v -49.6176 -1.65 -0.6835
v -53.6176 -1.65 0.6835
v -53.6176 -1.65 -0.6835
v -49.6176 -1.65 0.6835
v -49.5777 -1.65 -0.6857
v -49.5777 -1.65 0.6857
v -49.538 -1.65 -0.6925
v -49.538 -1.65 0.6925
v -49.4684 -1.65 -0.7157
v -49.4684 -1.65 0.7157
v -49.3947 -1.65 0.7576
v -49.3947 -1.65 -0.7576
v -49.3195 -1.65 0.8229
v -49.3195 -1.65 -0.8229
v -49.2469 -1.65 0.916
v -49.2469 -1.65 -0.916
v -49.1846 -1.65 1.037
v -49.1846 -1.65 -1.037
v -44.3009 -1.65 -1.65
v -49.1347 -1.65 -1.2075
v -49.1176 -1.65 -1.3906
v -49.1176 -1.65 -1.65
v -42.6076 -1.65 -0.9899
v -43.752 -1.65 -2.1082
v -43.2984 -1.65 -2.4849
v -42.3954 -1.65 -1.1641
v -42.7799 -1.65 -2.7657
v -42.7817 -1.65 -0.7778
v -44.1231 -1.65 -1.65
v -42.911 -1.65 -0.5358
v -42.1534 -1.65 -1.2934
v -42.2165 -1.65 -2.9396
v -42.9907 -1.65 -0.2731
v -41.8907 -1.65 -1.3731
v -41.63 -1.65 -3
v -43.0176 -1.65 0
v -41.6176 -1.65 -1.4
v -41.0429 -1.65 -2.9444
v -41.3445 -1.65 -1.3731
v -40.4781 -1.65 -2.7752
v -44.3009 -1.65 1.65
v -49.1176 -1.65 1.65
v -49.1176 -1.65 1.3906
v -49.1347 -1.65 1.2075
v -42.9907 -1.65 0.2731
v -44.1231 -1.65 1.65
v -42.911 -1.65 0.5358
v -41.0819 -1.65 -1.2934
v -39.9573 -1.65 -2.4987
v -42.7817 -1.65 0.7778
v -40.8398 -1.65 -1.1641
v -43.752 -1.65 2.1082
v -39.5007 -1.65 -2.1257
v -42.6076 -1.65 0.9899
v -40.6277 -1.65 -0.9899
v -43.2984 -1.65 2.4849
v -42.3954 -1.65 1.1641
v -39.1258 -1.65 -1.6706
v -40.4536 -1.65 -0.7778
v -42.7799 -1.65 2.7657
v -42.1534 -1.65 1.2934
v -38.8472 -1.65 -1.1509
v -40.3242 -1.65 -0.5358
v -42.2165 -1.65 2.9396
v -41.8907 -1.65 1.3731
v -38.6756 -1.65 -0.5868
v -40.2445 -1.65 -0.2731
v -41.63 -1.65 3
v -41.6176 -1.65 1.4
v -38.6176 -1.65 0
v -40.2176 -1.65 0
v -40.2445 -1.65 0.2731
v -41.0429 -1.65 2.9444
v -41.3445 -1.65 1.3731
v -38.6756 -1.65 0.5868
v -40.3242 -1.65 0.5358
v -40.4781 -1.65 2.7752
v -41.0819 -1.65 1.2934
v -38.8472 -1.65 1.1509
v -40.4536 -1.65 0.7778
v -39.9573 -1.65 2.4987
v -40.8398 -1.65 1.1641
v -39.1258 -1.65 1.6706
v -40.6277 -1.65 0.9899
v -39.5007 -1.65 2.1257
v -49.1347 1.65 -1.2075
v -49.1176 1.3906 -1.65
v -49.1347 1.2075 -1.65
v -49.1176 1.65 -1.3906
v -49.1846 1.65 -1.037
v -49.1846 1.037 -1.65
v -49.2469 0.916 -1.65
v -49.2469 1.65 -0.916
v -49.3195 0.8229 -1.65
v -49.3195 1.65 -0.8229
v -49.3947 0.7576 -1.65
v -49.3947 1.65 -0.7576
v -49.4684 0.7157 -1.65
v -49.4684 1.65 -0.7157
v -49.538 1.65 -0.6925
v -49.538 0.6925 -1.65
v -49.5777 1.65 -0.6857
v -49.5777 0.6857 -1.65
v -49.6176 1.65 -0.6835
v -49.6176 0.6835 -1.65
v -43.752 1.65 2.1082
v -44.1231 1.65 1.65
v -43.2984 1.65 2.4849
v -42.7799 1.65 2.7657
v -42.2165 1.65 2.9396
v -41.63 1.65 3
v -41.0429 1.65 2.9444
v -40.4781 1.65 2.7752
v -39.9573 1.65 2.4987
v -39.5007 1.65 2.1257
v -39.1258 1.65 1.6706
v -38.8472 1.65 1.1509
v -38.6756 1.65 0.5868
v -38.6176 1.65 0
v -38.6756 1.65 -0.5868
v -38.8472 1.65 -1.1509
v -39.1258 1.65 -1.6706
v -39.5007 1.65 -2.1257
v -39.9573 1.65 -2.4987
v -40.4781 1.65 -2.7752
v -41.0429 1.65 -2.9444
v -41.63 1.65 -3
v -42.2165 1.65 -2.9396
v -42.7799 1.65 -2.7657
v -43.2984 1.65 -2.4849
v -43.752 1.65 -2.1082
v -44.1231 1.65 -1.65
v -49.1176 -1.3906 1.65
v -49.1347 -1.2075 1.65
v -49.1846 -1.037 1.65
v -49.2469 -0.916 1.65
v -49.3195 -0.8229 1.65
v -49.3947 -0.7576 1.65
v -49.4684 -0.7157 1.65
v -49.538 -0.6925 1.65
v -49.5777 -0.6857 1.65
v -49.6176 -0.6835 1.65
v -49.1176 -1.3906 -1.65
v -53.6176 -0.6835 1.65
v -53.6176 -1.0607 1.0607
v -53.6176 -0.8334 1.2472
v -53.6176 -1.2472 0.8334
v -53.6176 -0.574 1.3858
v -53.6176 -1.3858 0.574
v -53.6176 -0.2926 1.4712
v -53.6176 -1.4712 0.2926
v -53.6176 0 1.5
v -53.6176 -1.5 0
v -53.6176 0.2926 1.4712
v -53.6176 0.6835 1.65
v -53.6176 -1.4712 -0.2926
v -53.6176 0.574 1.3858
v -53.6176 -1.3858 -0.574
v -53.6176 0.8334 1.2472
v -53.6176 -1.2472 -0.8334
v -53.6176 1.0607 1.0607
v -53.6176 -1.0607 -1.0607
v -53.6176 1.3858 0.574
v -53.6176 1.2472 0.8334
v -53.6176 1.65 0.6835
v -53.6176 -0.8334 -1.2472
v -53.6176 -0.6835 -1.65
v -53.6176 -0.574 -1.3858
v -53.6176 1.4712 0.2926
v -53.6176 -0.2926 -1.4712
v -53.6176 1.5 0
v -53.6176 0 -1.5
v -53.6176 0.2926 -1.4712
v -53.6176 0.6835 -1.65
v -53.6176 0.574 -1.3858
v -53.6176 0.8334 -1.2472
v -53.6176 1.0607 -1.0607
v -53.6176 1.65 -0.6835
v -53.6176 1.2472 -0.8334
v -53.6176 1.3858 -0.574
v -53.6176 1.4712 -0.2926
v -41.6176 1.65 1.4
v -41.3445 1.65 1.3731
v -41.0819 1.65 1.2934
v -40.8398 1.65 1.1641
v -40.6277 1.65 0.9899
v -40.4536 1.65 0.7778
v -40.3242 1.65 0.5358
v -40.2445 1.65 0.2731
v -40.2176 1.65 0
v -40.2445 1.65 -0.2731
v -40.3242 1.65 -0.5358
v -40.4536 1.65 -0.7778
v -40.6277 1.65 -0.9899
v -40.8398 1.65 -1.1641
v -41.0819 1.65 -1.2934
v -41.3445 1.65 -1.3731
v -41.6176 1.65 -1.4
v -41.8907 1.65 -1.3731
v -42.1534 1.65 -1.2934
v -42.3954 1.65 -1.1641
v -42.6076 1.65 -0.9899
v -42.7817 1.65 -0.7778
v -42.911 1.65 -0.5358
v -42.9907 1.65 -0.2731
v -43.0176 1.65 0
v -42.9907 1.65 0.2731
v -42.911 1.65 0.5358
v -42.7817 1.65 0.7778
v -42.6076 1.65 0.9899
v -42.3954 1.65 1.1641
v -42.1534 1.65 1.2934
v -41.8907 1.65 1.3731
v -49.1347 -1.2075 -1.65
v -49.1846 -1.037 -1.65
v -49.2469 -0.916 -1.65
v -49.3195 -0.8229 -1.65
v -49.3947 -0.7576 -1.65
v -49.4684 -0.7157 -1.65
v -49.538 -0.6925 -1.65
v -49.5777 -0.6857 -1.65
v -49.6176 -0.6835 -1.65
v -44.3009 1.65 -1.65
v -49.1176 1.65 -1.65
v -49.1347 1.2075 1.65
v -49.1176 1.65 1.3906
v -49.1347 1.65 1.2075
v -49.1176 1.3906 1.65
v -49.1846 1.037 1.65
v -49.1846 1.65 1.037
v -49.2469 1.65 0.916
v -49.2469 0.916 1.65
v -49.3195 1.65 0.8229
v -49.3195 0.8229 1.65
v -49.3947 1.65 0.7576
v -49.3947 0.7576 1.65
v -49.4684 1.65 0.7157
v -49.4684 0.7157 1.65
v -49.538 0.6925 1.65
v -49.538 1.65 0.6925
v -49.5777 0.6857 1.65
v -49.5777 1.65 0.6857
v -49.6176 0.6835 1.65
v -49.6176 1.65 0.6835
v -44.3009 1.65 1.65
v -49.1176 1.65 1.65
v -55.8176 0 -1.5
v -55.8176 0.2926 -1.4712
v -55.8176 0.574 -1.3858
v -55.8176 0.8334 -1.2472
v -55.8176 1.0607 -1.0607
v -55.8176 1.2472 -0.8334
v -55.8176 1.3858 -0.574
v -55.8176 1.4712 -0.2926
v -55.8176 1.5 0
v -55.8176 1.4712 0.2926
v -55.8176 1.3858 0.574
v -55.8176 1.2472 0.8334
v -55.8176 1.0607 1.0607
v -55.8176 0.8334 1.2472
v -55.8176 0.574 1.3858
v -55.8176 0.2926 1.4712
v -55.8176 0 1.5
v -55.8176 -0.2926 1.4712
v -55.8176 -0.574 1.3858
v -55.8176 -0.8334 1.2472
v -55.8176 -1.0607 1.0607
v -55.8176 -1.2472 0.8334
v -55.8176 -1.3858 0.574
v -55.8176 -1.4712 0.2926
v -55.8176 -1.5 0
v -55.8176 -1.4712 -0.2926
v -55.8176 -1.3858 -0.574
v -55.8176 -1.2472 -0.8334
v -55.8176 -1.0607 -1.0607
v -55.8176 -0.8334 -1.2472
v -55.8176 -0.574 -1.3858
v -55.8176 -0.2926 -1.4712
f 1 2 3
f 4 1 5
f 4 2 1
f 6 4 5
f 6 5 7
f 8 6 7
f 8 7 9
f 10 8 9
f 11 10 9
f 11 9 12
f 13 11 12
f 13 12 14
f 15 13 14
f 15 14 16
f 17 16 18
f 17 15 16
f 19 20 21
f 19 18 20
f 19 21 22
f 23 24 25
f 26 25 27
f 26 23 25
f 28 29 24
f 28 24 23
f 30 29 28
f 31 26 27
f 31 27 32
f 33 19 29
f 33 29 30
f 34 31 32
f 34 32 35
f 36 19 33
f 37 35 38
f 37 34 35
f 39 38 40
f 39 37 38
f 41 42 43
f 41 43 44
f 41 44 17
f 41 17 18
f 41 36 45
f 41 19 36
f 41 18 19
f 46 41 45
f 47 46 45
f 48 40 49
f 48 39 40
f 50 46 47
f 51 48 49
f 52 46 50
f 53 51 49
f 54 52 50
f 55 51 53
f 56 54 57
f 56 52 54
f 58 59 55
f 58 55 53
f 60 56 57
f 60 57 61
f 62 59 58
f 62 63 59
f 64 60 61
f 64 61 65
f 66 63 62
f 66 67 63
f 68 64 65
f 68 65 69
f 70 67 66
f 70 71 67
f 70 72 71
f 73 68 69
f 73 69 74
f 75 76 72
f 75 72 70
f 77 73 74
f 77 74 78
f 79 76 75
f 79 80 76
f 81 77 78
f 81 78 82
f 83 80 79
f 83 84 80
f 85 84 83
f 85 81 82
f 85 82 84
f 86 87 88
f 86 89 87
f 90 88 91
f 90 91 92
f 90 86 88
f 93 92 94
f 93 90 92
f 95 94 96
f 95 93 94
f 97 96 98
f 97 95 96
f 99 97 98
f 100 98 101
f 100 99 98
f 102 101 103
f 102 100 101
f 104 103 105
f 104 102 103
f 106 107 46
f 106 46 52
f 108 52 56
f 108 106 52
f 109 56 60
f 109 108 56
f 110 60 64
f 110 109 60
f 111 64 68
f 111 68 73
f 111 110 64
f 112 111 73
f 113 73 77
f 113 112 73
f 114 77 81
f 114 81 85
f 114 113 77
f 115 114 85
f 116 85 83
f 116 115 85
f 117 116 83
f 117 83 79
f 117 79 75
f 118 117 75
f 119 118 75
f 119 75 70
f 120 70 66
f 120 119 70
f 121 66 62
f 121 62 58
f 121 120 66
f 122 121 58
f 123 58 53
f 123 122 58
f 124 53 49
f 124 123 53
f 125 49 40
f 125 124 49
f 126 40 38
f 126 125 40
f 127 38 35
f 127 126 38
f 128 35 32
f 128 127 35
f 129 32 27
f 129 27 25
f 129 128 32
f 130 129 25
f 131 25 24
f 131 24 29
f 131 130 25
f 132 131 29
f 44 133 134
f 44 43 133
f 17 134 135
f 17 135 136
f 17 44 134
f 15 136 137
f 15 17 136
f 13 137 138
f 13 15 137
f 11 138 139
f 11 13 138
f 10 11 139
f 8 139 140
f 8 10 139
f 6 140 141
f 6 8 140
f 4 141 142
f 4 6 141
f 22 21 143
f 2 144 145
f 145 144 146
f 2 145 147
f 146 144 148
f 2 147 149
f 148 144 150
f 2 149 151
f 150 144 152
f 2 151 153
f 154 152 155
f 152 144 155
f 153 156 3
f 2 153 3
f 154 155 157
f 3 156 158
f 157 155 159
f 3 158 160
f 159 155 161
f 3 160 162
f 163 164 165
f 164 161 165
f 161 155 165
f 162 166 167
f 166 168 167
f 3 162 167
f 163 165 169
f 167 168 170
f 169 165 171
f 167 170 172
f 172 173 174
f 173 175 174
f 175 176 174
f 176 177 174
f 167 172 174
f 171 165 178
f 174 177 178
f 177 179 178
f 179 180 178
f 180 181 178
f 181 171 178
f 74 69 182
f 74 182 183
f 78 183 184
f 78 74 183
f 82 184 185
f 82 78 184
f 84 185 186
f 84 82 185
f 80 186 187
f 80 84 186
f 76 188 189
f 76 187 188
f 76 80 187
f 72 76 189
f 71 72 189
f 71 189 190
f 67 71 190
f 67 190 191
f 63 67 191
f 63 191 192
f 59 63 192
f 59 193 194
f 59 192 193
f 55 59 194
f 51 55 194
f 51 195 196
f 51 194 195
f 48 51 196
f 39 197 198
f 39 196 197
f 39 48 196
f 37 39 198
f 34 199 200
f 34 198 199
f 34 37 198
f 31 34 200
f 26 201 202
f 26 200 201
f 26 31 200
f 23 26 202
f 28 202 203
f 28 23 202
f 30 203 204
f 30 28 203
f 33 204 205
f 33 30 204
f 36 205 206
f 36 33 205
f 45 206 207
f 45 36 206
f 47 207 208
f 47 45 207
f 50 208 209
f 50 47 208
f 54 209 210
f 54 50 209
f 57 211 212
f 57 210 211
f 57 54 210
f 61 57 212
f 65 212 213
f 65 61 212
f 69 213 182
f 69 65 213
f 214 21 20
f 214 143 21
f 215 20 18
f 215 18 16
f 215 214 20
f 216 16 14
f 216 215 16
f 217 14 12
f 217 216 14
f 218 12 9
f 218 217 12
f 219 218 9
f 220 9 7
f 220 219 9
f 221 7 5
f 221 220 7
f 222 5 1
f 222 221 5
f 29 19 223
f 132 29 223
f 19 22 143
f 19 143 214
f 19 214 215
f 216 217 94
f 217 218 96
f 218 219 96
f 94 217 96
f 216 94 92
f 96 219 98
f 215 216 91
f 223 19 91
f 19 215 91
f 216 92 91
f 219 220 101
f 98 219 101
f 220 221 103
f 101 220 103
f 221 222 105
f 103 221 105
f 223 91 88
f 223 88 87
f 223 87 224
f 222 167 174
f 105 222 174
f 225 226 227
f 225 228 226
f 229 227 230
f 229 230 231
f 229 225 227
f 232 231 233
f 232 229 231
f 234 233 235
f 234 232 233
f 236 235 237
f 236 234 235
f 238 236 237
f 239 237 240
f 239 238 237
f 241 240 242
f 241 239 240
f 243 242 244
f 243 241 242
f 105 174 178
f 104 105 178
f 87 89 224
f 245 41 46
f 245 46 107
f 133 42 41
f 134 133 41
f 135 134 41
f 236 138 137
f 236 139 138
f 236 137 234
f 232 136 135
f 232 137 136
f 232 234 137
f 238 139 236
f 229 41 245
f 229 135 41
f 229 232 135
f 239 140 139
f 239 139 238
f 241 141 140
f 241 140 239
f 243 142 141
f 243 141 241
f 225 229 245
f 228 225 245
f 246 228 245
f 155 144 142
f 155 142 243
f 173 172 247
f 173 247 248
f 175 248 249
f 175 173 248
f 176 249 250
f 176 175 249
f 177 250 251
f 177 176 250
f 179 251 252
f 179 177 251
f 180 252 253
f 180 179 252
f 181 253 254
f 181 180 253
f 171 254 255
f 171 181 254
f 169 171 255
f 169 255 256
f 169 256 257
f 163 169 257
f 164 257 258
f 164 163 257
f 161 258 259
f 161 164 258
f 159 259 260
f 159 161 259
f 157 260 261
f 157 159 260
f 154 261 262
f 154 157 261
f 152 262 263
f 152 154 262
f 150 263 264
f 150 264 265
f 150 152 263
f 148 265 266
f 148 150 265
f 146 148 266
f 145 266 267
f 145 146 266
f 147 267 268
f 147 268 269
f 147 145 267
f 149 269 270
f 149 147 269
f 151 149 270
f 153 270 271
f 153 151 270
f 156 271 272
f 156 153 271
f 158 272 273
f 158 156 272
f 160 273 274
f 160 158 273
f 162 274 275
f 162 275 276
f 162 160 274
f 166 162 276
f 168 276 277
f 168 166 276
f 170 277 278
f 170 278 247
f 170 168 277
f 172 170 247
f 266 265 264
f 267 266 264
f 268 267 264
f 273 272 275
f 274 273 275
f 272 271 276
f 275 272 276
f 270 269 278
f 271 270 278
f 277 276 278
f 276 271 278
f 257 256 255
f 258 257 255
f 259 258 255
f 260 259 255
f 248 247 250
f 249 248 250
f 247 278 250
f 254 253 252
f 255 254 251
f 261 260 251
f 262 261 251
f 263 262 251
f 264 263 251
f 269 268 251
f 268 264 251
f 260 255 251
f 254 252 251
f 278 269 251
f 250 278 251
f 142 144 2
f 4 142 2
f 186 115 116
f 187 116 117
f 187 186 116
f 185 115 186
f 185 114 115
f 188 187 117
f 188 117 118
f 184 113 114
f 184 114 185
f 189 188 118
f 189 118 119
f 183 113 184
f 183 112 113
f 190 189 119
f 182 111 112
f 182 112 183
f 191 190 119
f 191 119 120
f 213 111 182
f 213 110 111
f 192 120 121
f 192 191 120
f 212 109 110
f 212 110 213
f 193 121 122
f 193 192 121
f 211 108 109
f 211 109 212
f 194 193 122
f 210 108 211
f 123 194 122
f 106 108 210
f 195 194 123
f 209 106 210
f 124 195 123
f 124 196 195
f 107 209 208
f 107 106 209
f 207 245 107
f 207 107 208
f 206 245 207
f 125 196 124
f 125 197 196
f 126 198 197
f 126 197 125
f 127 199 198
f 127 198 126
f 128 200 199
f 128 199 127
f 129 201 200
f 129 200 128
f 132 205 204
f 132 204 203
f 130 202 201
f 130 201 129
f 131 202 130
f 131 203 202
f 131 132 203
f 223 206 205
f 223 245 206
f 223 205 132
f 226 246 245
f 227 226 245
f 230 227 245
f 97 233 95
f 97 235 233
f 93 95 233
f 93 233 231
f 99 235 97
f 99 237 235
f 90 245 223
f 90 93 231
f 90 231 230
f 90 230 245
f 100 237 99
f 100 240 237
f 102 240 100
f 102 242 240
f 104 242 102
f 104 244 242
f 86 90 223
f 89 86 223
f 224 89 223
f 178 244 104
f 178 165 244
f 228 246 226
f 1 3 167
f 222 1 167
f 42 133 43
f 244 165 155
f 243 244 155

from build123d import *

# Parameters (mm, degrees)
SKETCH1_R                = 30
SKETCH1_R_2              = 14
BOSS_EXTRUDE1_DEPTH      = 18
BOSS_EXTRUDE2_DEPTH      = 45
SKETCH3_R                = 15
BOSS_EXTRUDE3_DEPTH      = 22
BOSS_EXTRUDE4_REACH      = 112.675
SKETCH4_W                = 33
SKETCH4_H                = 33
FILLET1_R                = 5
FILLET7_R                = 1.5
SCALA2_SCALE             = 0.1
SCHIZZO1_W               = 13.938376935
SCHIZZO1_H               = 12.715061938
TAGLIO_ESTRUSIONE1_DEPTH = 0.15
SCHIZZO2_W               = 8.711485585
SCHIZZO2_H               = 10.583528232
TAGLIO_ESTRUSIONE2_DEPTH = 0.15


with BuildPart() as part:
    # Sketch1 → Boss-Extrude1 (new, symmetric)
    with BuildSketch(Plane(origin=(0, 0, 0), x_dir=(1, 0, 0), z_dir=(0, 1, 0))):
        with Locations(Location((0, 0, 0), (0, 0, 270))):
            Circle(SKETCH1_R)
        with Locations(Location((0, 0, 0), (0, 0, 270))):
            Circle(SKETCH1_R_2, mode=Mode.SUBTRACT)
    extrude(amount=BOSS_EXTRUDE1_DEPTH, both=True)

    # Sketch4 → Boss-Extrude4 (add, up to next)
    with BuildSketch(Plane(origin=(-75, 0, 0), x_dir=(0, 0, -1), z_dir=(1, 0, 0)), mode=Mode.PRIVATE) as boss_extrude4_sk1:
        Rectangle(SKETCH4_W, SKETCH4_H)
    boss_extrude4_tool1 = extrude(boss_extrude4_sk1.sketch, amount=BOSS_EXTRUDE4_REACH, mode=Mode.PRIVATE) - part.part


with BuildPart() as body_2:
    # Sketch2 → Boss-Extrude2 (new body)
    with BuildSketch(Plane(origin=(-120, 0, 0), x_dir=(0, 0, -1), z_dir=(1, 0, 0))):
        Polygon((-16.5, 6.834523779), (-16.5, -6.834523779), (-6.834523779, -16.5), (6.834523779, -16.5), (16.5, -6.834523779), (16.5, 6.834523779), (6.834523779, 16.5), (-6.834523779, 16.5), align=None)
    extrude(amount=BOSS_EXTRUDE2_DEPTH)

    # Sketch3 → Boss-Extrude3 (add)
    with BuildSketch(Plane(origin=(-120, 0, 0), x_dir=(0, 0, -1), z_dir=(1, 0, 0))):
        Circle(SKETCH3_R)
    extrude(amount=-BOSS_EXTRUDE3_DEPTH)


with BuildPart() as part_1:
    add(part.part)

    add(body_2.part)  # Boss-Extrude4 merges body 2
    add(boss_extrude4_tool1.solids().sort_by_distance((-75, 0, 0))[0])

    # Fillet1
    fillet1_edges = [part_1.edges().sort_by_distance(p)[0] for p in [
        (-75, 11.66726189, 11.66726189),
        (-75, -11.66726189, 11.66726189),
        (-75, -11.66726189, -11.66726189),
        (-75, 11.66726189, -11.66726189),
    ]]
    fillet(fillet1_edges, radius=FILLET1_R)

    # Fillet7
    fillet7_edges = [part_1.edges().sort_by_distance(p)[0] for p in [
        (-30, -16.5, 0),
        (-30, 16.5, 0),
    ]]
    fillet(fillet7_edges, radius=FILLET7_R - 0.0001)  # a hair under: the kernel refuses the full size


with BuildPart() as part_2:
    # Scala2: scaled about (-46.241792436, -2e-09, 0)
    add(part_1.part.scale(SCALA2_SCALE).moved(Location((-41.617613192, -2e-09, 0))))

    # Schizzo1 → Taglio-Estrusione1 (cut)
    with BuildSketch(Plane(origin=(0, 1.8, 0), x_dir=(1, 0, 0), z_dir=(0, 1, 0))):
        with Locations((-40.78597266, -0.750670566)):
            Rectangle(SCHIZZO1_W, SCHIZZO1_H)
    extrude(amount=-TAGLIO_ESTRUSIONE1_DEPTH, mode=Mode.SUBTRACT)

    # Schizzo2 → Taglio-Estrusione2 (cut)
    with BuildSketch(Plane.XZ.offset(1.8)):
        with Locations((-41.379095083, -0.12974553)):
            Rectangle(SCHIZZO2_W, SCHIZZO2_H)
    extrude(amount=-TAGLIO_ESTRUSIONE2_DEPTH, mode=Mode.SUBTRACT)


solid = part_2.part
